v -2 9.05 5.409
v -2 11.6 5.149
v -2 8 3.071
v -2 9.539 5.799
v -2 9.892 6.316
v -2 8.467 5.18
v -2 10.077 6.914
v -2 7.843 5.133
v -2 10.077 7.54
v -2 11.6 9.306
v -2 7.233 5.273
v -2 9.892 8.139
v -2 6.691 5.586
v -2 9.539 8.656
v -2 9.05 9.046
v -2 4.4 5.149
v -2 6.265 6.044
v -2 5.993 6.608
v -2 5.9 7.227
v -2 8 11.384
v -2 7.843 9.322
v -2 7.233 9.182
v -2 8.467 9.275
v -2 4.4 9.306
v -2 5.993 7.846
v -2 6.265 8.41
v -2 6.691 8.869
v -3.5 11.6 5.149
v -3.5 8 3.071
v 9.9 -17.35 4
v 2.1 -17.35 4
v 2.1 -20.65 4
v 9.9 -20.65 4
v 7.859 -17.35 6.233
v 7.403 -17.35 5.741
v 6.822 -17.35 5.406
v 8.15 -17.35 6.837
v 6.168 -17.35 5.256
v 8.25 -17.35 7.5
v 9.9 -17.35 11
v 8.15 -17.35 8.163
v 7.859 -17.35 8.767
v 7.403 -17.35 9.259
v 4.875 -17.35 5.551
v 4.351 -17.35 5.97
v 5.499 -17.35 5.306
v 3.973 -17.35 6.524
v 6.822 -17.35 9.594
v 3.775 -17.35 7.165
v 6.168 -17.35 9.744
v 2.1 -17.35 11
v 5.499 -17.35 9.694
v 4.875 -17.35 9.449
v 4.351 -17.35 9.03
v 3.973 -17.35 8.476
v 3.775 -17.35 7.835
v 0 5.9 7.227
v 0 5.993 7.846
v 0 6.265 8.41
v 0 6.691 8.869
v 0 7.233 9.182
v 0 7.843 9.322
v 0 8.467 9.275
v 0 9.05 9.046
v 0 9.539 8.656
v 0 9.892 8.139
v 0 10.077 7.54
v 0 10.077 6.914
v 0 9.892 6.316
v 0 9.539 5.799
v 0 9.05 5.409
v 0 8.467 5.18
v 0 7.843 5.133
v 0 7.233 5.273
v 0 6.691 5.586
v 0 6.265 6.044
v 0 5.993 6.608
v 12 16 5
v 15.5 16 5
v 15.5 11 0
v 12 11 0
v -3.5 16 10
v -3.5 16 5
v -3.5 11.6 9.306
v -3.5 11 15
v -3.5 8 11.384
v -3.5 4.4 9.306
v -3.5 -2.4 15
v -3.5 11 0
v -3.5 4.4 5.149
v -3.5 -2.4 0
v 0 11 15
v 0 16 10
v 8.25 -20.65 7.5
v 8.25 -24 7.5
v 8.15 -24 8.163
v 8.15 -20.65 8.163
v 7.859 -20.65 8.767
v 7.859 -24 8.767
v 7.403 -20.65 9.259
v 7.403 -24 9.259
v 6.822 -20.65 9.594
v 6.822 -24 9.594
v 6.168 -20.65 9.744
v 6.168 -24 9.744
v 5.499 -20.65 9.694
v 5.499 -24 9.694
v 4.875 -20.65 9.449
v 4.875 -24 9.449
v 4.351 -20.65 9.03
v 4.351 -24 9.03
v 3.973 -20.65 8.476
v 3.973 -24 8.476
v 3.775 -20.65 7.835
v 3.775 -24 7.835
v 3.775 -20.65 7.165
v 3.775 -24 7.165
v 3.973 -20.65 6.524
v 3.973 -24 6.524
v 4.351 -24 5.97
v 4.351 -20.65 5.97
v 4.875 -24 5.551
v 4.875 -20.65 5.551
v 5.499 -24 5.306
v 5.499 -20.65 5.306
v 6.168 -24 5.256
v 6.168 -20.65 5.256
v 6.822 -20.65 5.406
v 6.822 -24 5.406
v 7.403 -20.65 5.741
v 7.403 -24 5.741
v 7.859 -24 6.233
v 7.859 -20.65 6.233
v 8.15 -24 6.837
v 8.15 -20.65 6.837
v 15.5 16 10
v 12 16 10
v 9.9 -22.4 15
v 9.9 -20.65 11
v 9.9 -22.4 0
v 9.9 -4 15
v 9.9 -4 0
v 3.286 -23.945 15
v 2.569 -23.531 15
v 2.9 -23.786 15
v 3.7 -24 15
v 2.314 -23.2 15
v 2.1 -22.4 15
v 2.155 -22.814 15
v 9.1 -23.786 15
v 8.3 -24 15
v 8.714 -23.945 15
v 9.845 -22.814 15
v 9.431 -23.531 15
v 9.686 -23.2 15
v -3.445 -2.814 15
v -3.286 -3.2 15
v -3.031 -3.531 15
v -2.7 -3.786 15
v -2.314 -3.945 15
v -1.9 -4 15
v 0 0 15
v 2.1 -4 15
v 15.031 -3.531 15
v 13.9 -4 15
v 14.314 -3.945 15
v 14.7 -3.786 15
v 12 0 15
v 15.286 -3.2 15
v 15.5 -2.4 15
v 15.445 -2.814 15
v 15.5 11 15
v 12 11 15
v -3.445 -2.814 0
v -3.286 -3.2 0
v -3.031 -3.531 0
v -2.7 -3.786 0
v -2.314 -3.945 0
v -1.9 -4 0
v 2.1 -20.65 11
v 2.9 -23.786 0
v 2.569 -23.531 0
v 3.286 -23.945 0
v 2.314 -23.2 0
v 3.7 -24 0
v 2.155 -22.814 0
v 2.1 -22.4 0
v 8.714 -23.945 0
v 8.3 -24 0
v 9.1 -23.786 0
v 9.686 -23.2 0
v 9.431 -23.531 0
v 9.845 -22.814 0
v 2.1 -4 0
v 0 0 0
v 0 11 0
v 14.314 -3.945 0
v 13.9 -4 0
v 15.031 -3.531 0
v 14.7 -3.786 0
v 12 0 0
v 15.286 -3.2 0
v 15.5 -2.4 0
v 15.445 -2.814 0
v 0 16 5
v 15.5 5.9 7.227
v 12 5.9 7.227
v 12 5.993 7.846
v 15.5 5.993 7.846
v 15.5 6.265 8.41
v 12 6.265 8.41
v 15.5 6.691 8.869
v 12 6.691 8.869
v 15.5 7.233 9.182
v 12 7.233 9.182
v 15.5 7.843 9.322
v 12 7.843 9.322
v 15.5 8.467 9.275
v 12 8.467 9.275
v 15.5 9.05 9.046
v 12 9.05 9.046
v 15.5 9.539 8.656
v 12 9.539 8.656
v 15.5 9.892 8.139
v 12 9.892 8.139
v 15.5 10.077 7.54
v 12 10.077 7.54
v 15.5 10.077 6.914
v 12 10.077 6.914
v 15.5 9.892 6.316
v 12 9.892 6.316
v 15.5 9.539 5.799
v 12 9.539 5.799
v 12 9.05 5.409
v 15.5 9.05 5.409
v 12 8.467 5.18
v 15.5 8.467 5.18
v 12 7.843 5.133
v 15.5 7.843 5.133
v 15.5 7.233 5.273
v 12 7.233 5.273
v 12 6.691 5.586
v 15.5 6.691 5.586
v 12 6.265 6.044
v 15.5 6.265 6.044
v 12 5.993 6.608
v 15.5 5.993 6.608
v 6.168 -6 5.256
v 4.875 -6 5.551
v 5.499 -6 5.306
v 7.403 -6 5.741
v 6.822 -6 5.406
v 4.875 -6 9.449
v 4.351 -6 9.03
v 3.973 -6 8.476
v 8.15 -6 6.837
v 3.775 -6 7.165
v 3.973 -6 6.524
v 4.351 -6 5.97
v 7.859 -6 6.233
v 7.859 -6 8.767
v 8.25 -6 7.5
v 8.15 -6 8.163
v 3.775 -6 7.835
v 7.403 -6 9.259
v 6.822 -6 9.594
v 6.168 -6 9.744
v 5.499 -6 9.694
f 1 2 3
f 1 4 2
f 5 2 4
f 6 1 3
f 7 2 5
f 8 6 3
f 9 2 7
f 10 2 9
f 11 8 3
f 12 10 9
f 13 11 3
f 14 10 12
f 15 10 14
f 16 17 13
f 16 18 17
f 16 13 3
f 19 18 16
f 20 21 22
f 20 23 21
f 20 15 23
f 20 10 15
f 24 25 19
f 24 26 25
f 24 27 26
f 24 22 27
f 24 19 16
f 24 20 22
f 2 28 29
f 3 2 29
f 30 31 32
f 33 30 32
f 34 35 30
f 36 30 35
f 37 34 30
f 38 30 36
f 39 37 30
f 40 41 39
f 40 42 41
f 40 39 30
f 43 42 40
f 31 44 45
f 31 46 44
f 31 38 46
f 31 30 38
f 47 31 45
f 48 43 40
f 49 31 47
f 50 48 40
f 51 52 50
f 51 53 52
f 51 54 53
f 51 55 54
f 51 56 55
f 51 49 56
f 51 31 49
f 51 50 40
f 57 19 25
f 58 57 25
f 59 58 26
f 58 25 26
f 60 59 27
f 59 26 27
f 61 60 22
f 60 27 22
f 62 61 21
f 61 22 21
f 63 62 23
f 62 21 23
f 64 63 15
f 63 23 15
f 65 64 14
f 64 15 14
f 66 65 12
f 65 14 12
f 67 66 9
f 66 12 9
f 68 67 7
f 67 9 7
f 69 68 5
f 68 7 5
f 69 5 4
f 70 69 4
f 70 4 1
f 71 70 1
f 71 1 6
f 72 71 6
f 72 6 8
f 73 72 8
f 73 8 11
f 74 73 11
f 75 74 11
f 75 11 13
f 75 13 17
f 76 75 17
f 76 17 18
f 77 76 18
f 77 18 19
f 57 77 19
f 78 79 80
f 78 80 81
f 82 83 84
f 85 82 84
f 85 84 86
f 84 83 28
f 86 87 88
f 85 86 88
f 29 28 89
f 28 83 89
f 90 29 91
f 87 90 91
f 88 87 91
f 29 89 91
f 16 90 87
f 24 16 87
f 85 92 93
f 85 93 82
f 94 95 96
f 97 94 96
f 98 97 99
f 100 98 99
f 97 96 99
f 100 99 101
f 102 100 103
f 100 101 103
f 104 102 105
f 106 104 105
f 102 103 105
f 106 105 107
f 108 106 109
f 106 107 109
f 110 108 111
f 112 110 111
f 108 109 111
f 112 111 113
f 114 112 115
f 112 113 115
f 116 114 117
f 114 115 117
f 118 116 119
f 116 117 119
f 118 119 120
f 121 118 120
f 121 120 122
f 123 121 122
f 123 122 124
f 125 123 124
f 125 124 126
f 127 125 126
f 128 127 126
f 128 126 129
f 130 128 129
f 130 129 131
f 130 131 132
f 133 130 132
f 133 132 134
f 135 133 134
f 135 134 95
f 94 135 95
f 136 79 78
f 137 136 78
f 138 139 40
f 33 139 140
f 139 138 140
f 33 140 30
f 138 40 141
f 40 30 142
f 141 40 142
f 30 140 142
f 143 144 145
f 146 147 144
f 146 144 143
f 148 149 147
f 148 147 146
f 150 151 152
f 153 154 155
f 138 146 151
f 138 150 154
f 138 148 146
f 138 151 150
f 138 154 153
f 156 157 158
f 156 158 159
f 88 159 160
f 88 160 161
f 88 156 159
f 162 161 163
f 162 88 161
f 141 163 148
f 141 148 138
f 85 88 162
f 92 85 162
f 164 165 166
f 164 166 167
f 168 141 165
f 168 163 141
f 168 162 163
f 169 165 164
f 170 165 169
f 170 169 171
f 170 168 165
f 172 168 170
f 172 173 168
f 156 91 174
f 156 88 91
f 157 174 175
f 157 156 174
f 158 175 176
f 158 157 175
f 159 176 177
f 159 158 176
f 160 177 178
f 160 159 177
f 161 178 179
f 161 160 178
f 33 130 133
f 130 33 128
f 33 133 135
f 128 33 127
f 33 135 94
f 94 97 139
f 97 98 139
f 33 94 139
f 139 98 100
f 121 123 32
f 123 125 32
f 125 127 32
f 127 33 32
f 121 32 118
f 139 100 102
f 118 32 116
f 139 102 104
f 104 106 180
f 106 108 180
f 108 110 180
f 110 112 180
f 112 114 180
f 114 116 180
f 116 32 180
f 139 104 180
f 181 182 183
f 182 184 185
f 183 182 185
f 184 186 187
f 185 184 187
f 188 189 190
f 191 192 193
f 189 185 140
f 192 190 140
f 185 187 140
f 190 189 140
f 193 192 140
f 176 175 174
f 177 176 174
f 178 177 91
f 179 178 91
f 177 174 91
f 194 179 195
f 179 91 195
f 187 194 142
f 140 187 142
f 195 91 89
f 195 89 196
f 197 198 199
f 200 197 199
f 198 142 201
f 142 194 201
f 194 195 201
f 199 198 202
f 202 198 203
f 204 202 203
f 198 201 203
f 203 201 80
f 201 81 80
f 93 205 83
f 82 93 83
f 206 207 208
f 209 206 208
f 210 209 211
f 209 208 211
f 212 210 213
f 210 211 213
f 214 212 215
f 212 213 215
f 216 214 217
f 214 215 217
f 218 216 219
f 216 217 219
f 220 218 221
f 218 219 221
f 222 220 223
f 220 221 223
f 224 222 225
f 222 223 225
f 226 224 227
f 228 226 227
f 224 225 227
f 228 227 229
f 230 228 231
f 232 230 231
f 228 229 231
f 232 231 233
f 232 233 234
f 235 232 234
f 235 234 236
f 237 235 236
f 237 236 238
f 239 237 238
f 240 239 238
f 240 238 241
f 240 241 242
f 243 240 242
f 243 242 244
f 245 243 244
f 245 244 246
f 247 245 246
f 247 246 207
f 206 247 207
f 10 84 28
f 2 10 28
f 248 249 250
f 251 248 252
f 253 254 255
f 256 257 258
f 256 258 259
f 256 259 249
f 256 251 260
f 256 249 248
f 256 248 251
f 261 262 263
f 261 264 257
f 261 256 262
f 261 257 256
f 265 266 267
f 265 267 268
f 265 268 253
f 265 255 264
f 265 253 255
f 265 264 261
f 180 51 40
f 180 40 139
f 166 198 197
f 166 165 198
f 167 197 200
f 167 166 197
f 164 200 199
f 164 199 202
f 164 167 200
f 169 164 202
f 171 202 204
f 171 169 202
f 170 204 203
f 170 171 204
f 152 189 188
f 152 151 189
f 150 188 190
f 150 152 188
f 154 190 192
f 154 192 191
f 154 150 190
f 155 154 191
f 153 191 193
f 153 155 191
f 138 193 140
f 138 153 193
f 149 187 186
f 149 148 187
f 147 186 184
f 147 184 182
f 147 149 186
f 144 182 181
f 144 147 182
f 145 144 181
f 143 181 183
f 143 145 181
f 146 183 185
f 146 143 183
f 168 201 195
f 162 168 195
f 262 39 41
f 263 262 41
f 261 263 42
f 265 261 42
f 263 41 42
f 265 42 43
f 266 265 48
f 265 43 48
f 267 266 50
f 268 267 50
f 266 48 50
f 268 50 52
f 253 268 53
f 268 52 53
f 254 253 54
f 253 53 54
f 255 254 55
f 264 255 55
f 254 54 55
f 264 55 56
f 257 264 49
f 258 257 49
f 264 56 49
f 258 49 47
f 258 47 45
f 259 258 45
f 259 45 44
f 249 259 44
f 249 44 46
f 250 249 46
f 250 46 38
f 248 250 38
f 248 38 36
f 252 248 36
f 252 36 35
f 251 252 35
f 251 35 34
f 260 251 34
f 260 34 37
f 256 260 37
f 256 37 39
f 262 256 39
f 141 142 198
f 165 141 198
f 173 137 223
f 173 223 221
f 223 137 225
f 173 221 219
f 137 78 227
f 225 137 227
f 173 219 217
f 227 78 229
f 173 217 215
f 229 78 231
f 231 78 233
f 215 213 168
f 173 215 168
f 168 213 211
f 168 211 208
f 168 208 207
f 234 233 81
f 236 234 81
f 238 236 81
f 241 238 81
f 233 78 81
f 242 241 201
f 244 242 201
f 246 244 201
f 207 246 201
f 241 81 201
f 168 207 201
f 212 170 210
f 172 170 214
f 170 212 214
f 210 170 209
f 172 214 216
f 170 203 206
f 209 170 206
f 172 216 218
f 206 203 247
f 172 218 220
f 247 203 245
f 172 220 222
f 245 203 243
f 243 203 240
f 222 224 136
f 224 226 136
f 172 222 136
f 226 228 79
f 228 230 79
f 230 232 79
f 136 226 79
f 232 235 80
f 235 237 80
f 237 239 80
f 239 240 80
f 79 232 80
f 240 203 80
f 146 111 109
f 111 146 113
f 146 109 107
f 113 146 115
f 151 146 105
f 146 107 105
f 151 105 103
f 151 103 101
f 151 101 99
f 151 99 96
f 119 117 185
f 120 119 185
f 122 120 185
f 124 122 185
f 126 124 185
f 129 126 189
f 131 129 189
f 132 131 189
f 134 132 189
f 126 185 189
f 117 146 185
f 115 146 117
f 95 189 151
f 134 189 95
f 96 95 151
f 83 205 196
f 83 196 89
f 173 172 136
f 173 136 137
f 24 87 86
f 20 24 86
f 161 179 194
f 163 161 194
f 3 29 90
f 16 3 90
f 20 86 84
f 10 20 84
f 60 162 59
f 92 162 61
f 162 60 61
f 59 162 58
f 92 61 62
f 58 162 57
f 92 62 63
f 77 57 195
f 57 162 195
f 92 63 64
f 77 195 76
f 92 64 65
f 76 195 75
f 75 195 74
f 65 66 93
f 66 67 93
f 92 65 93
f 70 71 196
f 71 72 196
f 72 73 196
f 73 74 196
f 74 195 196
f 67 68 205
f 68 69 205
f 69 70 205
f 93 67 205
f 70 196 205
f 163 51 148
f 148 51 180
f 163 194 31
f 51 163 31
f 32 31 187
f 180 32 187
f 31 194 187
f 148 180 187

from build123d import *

# Parameters (mm, degrees)
F1_DEPTH  = 15
F2_R      = 2.25
F3_DEPTH  = 18
F4_R      = 2.1
F5_DEPTH  = 25
F6_W      = 3.3
F6_H      = 7
F7_DEPTH  = 25
F8_R      = 1.6
F9_SIZE   = 5
F10_DEPTH = 1.5


with BuildPart() as f1:
    # F0 (on Top) → F1 (new body)
    with BuildSketch(Plane.XY):
        Polygon((12, 0), (0, 0), (0, 16), (-3.5, 16), (-3.5, -4), (2.1, -4), (6, -4), (9.9, -4), (15.5, -4), (15.5, 16), (12, 16), align=None)
        Polygon((6, -4), (2.1, -4), (2.1, -24), (9.9, -24), (9.9, -4), align=None)
    extrude(amount=F1_DEPTH)

    # F2 (on face) → F3 (cut)
    with BuildSketch(Plane.XZ.offset(24)):
        with Locations((6, 7.5)):
            Circle(F2_R)
    extrude(amount=-F3_DEPTH, mode=Mode.SUBTRACT)

    # F4 (on face) → F5 (cut)
    with BuildSketch(Plane(origin=(-3.5, 0, 0), x_dir=(0, -1, 0), z_dir=(-1, 0, 0))):
        with Locations((-8, 7.227462)):
            Circle(F4_R)
    extrude(amount=-F5_DEPTH, mode=Mode.SUBTRACT)

    # F6 (on face) → F7 (cut)
    with BuildSketch(Plane(origin=(2.1, 0, 0), x_dir=(0, -1, 0), z_dir=(-1, 0, 0))):
        with Locations((19, 7.5)):
            Rectangle(F6_W, F6_H)
    extrude(amount=-F7_DEPTH, mode=Mode.SUBTRACT)

    # F8
    f8_edges = [f1.edges().sort_by_distance(p)[0] for p in [
        (2.1, -24, 7.5),
        (9.9, -24, 7.5),
        (-3.5, -4, 7.5),
        (15.5, -4, 7.5),
    ]]
    fillet(f8_edges, radius=F8_R)

    # F9
    f9_edges = [f1.edges().sort_by_distance(p)[0] for p in [
        (-1.75, 16, 0),
        (13.75, 16, 0),
        (13.75, 16, 15),
        (-1.75, 16, 15),
    ]]
    chamfer(f9_edges, length=F9_SIZE)

    # F4 (on face) → F10 (cut)
    with BuildSketch(Plane(origin=(-3.5, 0, 0), x_dir=(0, -1, 0), z_dir=(-1, 0, 0))):
        Polygon((-4.4, 5.149002), (-4.4, 9.305923), (-8, 11.384384), (-11.6, 9.305923), (-11.6, 5.149002), (-8, 3.070541), align=None)
        with Locations((-8, 7.227462)):
            Circle(F4_R, mode=Mode.SUBTRACT)
    extrude(amount=-F10_DEPTH, mode=Mode.SUBTRACT)


solid = f1.part
